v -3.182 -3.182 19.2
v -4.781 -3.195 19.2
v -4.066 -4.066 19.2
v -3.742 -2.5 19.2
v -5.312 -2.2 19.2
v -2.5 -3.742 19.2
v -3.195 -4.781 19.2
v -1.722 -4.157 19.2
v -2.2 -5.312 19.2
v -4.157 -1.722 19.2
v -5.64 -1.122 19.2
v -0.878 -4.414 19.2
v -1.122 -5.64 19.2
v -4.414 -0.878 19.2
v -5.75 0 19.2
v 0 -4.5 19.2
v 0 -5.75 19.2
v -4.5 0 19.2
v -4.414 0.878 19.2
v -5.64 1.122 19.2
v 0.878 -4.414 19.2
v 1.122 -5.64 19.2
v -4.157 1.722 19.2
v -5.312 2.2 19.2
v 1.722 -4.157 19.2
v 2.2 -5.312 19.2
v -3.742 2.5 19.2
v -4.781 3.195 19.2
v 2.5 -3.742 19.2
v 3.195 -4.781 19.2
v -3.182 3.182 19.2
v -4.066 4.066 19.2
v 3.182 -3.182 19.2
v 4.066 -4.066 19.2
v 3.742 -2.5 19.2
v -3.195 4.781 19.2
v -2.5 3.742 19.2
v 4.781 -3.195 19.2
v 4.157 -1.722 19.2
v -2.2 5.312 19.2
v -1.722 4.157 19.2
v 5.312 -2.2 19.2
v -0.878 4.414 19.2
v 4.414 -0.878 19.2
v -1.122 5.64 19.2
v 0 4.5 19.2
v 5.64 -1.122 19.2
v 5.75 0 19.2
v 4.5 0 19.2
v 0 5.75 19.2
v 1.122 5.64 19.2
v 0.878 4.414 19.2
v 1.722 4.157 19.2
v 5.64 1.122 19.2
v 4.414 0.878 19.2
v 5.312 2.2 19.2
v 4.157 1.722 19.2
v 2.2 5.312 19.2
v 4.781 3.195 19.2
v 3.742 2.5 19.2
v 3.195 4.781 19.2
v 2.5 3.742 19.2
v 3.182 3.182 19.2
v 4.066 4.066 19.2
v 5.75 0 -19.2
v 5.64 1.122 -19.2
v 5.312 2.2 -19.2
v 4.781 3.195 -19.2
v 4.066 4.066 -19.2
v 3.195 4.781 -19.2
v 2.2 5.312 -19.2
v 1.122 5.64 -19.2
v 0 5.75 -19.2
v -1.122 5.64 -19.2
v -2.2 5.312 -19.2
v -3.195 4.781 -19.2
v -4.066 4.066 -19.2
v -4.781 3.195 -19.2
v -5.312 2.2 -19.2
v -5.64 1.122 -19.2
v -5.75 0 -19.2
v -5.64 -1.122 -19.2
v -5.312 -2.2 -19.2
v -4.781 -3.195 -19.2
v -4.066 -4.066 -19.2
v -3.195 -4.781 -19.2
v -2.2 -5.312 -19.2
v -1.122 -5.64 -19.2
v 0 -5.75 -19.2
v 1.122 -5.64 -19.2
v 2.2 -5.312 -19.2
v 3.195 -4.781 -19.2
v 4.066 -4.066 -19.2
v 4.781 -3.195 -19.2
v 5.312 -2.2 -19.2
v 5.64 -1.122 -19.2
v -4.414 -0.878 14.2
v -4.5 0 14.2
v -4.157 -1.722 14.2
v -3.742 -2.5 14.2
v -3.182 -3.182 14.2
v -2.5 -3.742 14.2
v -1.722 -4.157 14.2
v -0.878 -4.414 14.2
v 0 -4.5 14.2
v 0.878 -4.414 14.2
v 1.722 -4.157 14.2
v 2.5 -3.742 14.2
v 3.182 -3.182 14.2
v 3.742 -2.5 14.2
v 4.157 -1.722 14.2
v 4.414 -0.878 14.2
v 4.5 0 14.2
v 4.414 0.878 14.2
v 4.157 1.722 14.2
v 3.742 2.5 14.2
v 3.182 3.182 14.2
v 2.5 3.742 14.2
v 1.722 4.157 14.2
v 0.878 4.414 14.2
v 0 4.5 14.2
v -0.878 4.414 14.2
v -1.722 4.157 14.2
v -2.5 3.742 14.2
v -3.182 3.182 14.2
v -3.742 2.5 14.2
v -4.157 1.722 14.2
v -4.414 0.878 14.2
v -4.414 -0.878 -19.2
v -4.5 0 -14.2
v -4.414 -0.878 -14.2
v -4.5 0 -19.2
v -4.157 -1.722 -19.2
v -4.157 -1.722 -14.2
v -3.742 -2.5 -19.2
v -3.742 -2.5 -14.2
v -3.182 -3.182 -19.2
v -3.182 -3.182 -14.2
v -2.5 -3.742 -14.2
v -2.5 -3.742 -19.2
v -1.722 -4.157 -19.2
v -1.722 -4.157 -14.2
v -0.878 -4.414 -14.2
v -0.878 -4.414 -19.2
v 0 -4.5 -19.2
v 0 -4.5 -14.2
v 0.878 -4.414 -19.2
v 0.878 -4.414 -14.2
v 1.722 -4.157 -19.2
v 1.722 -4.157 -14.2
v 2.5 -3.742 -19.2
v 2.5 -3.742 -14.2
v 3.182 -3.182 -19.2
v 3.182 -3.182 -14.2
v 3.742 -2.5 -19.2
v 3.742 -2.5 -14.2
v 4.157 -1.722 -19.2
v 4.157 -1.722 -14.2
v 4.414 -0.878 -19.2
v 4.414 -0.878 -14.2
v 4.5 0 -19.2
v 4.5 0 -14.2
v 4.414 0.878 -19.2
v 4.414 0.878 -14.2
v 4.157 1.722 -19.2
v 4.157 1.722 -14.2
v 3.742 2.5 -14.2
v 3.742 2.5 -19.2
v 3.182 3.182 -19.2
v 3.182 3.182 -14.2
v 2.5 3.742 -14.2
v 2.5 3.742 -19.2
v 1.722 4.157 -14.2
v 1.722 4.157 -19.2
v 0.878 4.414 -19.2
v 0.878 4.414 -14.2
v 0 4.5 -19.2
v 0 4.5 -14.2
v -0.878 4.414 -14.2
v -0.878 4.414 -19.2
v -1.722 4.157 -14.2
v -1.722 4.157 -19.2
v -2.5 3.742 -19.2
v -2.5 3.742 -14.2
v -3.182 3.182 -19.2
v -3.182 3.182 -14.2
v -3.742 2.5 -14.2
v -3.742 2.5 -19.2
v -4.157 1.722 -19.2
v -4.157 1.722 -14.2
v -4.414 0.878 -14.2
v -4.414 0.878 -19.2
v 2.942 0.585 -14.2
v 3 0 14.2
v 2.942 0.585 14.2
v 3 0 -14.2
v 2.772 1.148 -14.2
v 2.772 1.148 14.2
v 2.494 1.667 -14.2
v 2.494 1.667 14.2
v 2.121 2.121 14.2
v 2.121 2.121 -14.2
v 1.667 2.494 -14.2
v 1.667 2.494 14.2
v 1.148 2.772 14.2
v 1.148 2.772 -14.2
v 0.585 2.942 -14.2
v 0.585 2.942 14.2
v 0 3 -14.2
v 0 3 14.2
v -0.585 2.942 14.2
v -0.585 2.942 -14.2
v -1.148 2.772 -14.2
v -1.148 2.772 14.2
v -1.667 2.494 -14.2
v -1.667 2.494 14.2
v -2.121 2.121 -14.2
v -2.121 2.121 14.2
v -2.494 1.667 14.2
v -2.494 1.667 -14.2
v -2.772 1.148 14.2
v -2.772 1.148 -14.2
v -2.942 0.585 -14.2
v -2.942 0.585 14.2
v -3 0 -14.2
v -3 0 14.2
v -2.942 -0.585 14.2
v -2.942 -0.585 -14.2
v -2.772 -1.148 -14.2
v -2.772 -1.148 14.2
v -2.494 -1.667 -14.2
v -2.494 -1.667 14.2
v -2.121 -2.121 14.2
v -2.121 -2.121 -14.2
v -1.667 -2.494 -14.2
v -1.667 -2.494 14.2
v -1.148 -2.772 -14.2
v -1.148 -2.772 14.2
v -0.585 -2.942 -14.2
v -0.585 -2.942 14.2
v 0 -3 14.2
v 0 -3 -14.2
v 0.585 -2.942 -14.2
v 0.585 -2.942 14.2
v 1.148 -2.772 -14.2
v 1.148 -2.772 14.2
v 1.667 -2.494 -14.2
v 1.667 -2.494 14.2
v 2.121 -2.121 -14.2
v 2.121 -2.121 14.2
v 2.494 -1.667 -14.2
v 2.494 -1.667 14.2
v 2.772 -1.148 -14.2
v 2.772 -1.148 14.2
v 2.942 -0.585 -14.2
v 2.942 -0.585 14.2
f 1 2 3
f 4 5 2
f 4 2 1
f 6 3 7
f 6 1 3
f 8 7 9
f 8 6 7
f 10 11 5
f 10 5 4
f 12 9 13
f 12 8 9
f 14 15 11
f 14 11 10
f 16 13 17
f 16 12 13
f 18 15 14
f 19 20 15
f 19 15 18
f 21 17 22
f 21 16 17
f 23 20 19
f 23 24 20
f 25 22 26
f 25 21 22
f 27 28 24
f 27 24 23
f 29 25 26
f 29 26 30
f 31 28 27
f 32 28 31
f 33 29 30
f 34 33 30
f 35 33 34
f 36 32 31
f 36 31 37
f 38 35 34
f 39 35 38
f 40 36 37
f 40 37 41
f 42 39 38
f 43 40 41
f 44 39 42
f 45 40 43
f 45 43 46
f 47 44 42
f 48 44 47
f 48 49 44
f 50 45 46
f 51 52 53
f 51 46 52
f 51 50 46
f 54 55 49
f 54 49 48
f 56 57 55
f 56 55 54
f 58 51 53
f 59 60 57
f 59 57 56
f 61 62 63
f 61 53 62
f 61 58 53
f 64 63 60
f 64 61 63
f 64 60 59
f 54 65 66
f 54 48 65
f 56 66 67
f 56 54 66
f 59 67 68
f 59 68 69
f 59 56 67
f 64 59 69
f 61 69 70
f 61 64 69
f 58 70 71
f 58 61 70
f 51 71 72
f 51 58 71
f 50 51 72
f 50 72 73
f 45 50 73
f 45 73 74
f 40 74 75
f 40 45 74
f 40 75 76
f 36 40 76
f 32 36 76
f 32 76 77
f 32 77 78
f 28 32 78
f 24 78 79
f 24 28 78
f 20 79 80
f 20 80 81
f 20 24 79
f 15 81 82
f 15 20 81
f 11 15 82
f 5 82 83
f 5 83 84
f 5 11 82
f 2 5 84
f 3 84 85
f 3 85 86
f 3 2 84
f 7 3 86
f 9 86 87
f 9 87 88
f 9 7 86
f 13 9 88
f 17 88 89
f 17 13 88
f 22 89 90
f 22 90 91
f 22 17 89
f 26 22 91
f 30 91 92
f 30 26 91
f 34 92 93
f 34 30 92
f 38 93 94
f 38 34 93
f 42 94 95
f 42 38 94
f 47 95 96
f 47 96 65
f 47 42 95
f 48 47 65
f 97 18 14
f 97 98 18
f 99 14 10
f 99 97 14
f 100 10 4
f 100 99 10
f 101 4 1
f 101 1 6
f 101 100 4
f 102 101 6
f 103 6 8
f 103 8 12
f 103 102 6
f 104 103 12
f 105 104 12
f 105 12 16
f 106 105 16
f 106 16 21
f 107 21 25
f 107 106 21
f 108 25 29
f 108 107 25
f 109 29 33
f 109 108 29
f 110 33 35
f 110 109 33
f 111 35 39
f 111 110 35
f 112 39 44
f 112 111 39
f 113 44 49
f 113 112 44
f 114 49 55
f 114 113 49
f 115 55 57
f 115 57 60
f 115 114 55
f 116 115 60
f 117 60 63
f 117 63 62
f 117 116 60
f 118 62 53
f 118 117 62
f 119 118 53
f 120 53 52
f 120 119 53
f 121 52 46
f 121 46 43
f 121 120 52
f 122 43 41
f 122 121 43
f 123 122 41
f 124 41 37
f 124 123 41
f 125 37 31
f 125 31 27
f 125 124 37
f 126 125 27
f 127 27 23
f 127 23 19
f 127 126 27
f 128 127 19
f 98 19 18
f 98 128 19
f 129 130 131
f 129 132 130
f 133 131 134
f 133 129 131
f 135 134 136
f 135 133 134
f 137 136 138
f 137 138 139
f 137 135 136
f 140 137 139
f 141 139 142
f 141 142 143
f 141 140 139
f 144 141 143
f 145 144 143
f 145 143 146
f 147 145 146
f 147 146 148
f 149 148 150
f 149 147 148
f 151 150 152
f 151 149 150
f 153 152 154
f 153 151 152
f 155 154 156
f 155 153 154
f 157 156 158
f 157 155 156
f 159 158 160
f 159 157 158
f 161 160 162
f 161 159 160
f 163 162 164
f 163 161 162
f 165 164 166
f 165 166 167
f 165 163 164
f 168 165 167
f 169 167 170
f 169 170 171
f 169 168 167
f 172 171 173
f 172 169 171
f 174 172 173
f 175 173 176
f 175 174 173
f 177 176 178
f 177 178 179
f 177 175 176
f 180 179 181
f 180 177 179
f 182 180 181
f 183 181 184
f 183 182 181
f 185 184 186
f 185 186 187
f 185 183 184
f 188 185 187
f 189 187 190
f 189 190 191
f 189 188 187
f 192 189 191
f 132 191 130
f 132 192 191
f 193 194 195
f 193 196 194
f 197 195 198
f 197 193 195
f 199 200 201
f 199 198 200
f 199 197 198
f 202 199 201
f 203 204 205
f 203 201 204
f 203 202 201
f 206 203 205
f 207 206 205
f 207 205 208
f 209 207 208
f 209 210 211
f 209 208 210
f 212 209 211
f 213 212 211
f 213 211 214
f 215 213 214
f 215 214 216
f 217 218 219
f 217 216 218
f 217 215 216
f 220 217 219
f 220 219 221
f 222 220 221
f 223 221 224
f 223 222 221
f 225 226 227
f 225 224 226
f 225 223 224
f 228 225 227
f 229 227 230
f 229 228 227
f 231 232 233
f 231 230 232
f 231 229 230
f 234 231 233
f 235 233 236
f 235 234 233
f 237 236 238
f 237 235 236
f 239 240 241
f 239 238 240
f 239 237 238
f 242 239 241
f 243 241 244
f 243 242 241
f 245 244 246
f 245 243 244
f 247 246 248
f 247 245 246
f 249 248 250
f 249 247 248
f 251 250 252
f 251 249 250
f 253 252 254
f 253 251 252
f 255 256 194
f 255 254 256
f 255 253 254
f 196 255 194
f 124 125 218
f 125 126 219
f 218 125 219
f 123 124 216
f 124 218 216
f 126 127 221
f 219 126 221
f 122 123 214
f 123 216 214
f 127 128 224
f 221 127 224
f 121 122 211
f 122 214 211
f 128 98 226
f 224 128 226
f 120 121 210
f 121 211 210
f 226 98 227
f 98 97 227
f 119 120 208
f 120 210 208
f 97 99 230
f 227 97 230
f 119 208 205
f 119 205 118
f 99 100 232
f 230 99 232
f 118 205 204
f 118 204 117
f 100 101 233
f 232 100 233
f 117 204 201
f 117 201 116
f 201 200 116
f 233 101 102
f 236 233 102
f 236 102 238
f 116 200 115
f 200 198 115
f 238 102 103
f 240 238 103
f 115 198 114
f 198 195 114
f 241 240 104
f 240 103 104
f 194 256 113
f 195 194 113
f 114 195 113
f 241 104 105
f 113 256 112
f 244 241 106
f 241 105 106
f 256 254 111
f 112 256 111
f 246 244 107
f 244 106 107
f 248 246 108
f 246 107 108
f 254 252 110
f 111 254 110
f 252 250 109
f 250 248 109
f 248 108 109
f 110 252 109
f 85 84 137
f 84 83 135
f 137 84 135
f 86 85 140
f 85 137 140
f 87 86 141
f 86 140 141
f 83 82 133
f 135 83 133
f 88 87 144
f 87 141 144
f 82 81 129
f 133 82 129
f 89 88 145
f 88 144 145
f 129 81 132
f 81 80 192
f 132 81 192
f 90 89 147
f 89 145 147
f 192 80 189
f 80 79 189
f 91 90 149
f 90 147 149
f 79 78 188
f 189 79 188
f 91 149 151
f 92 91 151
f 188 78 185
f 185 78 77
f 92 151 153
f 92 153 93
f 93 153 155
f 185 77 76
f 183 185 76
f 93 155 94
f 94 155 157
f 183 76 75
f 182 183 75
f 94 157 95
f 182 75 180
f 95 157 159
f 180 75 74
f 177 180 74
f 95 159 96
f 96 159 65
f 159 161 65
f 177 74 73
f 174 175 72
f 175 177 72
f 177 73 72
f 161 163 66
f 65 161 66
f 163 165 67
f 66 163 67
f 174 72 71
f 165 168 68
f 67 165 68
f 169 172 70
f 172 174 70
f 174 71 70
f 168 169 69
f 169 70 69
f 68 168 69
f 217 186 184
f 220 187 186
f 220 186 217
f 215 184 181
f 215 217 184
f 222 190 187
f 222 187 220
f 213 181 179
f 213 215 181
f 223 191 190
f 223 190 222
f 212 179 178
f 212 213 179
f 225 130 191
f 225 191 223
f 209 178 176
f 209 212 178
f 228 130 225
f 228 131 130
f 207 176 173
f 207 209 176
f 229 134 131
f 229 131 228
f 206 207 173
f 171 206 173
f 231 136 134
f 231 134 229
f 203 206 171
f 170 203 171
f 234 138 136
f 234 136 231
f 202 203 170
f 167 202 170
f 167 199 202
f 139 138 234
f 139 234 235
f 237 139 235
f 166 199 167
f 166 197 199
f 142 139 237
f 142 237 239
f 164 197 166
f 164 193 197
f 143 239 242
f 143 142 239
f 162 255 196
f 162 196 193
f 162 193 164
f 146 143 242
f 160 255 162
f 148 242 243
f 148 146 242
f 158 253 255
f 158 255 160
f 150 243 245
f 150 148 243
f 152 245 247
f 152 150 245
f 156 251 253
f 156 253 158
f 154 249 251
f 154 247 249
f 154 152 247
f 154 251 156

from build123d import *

# Parameters (mm, degrees)
SKETCH2_R           = 5.75
SKETCH2_R_2         = 3
BOSS_EXTRUDE1_DEPTH = 19.2
SKETCH5_W           = 5
SKETCH5_H           = 4.5


with BuildPart() as part:
    # Sketch2 → Boss-Extrude1 (new, symmetric)
    with BuildSketch(Plane.XY):
        Circle(SKETCH2_R)
        Circle(SKETCH2_R_2, mode=Mode.SUBTRACT)
    extrude(amount=BOSS_EXTRUDE1_DEPTH, both=True)

    # Sketch5 → Cut-Revolve1 (revolve, cut)
    with BuildSketch(Plane(origin=(0, 0, 0), x_dir=(0, 0, -1), z_dir=(1, 0, 0)), mode=Mode.PRIVATE) as cut_revolve1_sk:
        with Locations((16.7, 2.25)):
            Rectangle(SKETCH5_W, SKETCH5_H)
        with Locations((-16.7, 2.25)):
            Rectangle(SKETCH5_W, SKETCH5_H)
    revolve(cut_revolve1_sk.sketch.rotate(Axis((0, 0, -19.2), (0, 0, 1)), 90), axis=Axis((0, 0, -19.2), (0, 0, 1)), mode=Mode.SUBTRACT)


solid = part.part
